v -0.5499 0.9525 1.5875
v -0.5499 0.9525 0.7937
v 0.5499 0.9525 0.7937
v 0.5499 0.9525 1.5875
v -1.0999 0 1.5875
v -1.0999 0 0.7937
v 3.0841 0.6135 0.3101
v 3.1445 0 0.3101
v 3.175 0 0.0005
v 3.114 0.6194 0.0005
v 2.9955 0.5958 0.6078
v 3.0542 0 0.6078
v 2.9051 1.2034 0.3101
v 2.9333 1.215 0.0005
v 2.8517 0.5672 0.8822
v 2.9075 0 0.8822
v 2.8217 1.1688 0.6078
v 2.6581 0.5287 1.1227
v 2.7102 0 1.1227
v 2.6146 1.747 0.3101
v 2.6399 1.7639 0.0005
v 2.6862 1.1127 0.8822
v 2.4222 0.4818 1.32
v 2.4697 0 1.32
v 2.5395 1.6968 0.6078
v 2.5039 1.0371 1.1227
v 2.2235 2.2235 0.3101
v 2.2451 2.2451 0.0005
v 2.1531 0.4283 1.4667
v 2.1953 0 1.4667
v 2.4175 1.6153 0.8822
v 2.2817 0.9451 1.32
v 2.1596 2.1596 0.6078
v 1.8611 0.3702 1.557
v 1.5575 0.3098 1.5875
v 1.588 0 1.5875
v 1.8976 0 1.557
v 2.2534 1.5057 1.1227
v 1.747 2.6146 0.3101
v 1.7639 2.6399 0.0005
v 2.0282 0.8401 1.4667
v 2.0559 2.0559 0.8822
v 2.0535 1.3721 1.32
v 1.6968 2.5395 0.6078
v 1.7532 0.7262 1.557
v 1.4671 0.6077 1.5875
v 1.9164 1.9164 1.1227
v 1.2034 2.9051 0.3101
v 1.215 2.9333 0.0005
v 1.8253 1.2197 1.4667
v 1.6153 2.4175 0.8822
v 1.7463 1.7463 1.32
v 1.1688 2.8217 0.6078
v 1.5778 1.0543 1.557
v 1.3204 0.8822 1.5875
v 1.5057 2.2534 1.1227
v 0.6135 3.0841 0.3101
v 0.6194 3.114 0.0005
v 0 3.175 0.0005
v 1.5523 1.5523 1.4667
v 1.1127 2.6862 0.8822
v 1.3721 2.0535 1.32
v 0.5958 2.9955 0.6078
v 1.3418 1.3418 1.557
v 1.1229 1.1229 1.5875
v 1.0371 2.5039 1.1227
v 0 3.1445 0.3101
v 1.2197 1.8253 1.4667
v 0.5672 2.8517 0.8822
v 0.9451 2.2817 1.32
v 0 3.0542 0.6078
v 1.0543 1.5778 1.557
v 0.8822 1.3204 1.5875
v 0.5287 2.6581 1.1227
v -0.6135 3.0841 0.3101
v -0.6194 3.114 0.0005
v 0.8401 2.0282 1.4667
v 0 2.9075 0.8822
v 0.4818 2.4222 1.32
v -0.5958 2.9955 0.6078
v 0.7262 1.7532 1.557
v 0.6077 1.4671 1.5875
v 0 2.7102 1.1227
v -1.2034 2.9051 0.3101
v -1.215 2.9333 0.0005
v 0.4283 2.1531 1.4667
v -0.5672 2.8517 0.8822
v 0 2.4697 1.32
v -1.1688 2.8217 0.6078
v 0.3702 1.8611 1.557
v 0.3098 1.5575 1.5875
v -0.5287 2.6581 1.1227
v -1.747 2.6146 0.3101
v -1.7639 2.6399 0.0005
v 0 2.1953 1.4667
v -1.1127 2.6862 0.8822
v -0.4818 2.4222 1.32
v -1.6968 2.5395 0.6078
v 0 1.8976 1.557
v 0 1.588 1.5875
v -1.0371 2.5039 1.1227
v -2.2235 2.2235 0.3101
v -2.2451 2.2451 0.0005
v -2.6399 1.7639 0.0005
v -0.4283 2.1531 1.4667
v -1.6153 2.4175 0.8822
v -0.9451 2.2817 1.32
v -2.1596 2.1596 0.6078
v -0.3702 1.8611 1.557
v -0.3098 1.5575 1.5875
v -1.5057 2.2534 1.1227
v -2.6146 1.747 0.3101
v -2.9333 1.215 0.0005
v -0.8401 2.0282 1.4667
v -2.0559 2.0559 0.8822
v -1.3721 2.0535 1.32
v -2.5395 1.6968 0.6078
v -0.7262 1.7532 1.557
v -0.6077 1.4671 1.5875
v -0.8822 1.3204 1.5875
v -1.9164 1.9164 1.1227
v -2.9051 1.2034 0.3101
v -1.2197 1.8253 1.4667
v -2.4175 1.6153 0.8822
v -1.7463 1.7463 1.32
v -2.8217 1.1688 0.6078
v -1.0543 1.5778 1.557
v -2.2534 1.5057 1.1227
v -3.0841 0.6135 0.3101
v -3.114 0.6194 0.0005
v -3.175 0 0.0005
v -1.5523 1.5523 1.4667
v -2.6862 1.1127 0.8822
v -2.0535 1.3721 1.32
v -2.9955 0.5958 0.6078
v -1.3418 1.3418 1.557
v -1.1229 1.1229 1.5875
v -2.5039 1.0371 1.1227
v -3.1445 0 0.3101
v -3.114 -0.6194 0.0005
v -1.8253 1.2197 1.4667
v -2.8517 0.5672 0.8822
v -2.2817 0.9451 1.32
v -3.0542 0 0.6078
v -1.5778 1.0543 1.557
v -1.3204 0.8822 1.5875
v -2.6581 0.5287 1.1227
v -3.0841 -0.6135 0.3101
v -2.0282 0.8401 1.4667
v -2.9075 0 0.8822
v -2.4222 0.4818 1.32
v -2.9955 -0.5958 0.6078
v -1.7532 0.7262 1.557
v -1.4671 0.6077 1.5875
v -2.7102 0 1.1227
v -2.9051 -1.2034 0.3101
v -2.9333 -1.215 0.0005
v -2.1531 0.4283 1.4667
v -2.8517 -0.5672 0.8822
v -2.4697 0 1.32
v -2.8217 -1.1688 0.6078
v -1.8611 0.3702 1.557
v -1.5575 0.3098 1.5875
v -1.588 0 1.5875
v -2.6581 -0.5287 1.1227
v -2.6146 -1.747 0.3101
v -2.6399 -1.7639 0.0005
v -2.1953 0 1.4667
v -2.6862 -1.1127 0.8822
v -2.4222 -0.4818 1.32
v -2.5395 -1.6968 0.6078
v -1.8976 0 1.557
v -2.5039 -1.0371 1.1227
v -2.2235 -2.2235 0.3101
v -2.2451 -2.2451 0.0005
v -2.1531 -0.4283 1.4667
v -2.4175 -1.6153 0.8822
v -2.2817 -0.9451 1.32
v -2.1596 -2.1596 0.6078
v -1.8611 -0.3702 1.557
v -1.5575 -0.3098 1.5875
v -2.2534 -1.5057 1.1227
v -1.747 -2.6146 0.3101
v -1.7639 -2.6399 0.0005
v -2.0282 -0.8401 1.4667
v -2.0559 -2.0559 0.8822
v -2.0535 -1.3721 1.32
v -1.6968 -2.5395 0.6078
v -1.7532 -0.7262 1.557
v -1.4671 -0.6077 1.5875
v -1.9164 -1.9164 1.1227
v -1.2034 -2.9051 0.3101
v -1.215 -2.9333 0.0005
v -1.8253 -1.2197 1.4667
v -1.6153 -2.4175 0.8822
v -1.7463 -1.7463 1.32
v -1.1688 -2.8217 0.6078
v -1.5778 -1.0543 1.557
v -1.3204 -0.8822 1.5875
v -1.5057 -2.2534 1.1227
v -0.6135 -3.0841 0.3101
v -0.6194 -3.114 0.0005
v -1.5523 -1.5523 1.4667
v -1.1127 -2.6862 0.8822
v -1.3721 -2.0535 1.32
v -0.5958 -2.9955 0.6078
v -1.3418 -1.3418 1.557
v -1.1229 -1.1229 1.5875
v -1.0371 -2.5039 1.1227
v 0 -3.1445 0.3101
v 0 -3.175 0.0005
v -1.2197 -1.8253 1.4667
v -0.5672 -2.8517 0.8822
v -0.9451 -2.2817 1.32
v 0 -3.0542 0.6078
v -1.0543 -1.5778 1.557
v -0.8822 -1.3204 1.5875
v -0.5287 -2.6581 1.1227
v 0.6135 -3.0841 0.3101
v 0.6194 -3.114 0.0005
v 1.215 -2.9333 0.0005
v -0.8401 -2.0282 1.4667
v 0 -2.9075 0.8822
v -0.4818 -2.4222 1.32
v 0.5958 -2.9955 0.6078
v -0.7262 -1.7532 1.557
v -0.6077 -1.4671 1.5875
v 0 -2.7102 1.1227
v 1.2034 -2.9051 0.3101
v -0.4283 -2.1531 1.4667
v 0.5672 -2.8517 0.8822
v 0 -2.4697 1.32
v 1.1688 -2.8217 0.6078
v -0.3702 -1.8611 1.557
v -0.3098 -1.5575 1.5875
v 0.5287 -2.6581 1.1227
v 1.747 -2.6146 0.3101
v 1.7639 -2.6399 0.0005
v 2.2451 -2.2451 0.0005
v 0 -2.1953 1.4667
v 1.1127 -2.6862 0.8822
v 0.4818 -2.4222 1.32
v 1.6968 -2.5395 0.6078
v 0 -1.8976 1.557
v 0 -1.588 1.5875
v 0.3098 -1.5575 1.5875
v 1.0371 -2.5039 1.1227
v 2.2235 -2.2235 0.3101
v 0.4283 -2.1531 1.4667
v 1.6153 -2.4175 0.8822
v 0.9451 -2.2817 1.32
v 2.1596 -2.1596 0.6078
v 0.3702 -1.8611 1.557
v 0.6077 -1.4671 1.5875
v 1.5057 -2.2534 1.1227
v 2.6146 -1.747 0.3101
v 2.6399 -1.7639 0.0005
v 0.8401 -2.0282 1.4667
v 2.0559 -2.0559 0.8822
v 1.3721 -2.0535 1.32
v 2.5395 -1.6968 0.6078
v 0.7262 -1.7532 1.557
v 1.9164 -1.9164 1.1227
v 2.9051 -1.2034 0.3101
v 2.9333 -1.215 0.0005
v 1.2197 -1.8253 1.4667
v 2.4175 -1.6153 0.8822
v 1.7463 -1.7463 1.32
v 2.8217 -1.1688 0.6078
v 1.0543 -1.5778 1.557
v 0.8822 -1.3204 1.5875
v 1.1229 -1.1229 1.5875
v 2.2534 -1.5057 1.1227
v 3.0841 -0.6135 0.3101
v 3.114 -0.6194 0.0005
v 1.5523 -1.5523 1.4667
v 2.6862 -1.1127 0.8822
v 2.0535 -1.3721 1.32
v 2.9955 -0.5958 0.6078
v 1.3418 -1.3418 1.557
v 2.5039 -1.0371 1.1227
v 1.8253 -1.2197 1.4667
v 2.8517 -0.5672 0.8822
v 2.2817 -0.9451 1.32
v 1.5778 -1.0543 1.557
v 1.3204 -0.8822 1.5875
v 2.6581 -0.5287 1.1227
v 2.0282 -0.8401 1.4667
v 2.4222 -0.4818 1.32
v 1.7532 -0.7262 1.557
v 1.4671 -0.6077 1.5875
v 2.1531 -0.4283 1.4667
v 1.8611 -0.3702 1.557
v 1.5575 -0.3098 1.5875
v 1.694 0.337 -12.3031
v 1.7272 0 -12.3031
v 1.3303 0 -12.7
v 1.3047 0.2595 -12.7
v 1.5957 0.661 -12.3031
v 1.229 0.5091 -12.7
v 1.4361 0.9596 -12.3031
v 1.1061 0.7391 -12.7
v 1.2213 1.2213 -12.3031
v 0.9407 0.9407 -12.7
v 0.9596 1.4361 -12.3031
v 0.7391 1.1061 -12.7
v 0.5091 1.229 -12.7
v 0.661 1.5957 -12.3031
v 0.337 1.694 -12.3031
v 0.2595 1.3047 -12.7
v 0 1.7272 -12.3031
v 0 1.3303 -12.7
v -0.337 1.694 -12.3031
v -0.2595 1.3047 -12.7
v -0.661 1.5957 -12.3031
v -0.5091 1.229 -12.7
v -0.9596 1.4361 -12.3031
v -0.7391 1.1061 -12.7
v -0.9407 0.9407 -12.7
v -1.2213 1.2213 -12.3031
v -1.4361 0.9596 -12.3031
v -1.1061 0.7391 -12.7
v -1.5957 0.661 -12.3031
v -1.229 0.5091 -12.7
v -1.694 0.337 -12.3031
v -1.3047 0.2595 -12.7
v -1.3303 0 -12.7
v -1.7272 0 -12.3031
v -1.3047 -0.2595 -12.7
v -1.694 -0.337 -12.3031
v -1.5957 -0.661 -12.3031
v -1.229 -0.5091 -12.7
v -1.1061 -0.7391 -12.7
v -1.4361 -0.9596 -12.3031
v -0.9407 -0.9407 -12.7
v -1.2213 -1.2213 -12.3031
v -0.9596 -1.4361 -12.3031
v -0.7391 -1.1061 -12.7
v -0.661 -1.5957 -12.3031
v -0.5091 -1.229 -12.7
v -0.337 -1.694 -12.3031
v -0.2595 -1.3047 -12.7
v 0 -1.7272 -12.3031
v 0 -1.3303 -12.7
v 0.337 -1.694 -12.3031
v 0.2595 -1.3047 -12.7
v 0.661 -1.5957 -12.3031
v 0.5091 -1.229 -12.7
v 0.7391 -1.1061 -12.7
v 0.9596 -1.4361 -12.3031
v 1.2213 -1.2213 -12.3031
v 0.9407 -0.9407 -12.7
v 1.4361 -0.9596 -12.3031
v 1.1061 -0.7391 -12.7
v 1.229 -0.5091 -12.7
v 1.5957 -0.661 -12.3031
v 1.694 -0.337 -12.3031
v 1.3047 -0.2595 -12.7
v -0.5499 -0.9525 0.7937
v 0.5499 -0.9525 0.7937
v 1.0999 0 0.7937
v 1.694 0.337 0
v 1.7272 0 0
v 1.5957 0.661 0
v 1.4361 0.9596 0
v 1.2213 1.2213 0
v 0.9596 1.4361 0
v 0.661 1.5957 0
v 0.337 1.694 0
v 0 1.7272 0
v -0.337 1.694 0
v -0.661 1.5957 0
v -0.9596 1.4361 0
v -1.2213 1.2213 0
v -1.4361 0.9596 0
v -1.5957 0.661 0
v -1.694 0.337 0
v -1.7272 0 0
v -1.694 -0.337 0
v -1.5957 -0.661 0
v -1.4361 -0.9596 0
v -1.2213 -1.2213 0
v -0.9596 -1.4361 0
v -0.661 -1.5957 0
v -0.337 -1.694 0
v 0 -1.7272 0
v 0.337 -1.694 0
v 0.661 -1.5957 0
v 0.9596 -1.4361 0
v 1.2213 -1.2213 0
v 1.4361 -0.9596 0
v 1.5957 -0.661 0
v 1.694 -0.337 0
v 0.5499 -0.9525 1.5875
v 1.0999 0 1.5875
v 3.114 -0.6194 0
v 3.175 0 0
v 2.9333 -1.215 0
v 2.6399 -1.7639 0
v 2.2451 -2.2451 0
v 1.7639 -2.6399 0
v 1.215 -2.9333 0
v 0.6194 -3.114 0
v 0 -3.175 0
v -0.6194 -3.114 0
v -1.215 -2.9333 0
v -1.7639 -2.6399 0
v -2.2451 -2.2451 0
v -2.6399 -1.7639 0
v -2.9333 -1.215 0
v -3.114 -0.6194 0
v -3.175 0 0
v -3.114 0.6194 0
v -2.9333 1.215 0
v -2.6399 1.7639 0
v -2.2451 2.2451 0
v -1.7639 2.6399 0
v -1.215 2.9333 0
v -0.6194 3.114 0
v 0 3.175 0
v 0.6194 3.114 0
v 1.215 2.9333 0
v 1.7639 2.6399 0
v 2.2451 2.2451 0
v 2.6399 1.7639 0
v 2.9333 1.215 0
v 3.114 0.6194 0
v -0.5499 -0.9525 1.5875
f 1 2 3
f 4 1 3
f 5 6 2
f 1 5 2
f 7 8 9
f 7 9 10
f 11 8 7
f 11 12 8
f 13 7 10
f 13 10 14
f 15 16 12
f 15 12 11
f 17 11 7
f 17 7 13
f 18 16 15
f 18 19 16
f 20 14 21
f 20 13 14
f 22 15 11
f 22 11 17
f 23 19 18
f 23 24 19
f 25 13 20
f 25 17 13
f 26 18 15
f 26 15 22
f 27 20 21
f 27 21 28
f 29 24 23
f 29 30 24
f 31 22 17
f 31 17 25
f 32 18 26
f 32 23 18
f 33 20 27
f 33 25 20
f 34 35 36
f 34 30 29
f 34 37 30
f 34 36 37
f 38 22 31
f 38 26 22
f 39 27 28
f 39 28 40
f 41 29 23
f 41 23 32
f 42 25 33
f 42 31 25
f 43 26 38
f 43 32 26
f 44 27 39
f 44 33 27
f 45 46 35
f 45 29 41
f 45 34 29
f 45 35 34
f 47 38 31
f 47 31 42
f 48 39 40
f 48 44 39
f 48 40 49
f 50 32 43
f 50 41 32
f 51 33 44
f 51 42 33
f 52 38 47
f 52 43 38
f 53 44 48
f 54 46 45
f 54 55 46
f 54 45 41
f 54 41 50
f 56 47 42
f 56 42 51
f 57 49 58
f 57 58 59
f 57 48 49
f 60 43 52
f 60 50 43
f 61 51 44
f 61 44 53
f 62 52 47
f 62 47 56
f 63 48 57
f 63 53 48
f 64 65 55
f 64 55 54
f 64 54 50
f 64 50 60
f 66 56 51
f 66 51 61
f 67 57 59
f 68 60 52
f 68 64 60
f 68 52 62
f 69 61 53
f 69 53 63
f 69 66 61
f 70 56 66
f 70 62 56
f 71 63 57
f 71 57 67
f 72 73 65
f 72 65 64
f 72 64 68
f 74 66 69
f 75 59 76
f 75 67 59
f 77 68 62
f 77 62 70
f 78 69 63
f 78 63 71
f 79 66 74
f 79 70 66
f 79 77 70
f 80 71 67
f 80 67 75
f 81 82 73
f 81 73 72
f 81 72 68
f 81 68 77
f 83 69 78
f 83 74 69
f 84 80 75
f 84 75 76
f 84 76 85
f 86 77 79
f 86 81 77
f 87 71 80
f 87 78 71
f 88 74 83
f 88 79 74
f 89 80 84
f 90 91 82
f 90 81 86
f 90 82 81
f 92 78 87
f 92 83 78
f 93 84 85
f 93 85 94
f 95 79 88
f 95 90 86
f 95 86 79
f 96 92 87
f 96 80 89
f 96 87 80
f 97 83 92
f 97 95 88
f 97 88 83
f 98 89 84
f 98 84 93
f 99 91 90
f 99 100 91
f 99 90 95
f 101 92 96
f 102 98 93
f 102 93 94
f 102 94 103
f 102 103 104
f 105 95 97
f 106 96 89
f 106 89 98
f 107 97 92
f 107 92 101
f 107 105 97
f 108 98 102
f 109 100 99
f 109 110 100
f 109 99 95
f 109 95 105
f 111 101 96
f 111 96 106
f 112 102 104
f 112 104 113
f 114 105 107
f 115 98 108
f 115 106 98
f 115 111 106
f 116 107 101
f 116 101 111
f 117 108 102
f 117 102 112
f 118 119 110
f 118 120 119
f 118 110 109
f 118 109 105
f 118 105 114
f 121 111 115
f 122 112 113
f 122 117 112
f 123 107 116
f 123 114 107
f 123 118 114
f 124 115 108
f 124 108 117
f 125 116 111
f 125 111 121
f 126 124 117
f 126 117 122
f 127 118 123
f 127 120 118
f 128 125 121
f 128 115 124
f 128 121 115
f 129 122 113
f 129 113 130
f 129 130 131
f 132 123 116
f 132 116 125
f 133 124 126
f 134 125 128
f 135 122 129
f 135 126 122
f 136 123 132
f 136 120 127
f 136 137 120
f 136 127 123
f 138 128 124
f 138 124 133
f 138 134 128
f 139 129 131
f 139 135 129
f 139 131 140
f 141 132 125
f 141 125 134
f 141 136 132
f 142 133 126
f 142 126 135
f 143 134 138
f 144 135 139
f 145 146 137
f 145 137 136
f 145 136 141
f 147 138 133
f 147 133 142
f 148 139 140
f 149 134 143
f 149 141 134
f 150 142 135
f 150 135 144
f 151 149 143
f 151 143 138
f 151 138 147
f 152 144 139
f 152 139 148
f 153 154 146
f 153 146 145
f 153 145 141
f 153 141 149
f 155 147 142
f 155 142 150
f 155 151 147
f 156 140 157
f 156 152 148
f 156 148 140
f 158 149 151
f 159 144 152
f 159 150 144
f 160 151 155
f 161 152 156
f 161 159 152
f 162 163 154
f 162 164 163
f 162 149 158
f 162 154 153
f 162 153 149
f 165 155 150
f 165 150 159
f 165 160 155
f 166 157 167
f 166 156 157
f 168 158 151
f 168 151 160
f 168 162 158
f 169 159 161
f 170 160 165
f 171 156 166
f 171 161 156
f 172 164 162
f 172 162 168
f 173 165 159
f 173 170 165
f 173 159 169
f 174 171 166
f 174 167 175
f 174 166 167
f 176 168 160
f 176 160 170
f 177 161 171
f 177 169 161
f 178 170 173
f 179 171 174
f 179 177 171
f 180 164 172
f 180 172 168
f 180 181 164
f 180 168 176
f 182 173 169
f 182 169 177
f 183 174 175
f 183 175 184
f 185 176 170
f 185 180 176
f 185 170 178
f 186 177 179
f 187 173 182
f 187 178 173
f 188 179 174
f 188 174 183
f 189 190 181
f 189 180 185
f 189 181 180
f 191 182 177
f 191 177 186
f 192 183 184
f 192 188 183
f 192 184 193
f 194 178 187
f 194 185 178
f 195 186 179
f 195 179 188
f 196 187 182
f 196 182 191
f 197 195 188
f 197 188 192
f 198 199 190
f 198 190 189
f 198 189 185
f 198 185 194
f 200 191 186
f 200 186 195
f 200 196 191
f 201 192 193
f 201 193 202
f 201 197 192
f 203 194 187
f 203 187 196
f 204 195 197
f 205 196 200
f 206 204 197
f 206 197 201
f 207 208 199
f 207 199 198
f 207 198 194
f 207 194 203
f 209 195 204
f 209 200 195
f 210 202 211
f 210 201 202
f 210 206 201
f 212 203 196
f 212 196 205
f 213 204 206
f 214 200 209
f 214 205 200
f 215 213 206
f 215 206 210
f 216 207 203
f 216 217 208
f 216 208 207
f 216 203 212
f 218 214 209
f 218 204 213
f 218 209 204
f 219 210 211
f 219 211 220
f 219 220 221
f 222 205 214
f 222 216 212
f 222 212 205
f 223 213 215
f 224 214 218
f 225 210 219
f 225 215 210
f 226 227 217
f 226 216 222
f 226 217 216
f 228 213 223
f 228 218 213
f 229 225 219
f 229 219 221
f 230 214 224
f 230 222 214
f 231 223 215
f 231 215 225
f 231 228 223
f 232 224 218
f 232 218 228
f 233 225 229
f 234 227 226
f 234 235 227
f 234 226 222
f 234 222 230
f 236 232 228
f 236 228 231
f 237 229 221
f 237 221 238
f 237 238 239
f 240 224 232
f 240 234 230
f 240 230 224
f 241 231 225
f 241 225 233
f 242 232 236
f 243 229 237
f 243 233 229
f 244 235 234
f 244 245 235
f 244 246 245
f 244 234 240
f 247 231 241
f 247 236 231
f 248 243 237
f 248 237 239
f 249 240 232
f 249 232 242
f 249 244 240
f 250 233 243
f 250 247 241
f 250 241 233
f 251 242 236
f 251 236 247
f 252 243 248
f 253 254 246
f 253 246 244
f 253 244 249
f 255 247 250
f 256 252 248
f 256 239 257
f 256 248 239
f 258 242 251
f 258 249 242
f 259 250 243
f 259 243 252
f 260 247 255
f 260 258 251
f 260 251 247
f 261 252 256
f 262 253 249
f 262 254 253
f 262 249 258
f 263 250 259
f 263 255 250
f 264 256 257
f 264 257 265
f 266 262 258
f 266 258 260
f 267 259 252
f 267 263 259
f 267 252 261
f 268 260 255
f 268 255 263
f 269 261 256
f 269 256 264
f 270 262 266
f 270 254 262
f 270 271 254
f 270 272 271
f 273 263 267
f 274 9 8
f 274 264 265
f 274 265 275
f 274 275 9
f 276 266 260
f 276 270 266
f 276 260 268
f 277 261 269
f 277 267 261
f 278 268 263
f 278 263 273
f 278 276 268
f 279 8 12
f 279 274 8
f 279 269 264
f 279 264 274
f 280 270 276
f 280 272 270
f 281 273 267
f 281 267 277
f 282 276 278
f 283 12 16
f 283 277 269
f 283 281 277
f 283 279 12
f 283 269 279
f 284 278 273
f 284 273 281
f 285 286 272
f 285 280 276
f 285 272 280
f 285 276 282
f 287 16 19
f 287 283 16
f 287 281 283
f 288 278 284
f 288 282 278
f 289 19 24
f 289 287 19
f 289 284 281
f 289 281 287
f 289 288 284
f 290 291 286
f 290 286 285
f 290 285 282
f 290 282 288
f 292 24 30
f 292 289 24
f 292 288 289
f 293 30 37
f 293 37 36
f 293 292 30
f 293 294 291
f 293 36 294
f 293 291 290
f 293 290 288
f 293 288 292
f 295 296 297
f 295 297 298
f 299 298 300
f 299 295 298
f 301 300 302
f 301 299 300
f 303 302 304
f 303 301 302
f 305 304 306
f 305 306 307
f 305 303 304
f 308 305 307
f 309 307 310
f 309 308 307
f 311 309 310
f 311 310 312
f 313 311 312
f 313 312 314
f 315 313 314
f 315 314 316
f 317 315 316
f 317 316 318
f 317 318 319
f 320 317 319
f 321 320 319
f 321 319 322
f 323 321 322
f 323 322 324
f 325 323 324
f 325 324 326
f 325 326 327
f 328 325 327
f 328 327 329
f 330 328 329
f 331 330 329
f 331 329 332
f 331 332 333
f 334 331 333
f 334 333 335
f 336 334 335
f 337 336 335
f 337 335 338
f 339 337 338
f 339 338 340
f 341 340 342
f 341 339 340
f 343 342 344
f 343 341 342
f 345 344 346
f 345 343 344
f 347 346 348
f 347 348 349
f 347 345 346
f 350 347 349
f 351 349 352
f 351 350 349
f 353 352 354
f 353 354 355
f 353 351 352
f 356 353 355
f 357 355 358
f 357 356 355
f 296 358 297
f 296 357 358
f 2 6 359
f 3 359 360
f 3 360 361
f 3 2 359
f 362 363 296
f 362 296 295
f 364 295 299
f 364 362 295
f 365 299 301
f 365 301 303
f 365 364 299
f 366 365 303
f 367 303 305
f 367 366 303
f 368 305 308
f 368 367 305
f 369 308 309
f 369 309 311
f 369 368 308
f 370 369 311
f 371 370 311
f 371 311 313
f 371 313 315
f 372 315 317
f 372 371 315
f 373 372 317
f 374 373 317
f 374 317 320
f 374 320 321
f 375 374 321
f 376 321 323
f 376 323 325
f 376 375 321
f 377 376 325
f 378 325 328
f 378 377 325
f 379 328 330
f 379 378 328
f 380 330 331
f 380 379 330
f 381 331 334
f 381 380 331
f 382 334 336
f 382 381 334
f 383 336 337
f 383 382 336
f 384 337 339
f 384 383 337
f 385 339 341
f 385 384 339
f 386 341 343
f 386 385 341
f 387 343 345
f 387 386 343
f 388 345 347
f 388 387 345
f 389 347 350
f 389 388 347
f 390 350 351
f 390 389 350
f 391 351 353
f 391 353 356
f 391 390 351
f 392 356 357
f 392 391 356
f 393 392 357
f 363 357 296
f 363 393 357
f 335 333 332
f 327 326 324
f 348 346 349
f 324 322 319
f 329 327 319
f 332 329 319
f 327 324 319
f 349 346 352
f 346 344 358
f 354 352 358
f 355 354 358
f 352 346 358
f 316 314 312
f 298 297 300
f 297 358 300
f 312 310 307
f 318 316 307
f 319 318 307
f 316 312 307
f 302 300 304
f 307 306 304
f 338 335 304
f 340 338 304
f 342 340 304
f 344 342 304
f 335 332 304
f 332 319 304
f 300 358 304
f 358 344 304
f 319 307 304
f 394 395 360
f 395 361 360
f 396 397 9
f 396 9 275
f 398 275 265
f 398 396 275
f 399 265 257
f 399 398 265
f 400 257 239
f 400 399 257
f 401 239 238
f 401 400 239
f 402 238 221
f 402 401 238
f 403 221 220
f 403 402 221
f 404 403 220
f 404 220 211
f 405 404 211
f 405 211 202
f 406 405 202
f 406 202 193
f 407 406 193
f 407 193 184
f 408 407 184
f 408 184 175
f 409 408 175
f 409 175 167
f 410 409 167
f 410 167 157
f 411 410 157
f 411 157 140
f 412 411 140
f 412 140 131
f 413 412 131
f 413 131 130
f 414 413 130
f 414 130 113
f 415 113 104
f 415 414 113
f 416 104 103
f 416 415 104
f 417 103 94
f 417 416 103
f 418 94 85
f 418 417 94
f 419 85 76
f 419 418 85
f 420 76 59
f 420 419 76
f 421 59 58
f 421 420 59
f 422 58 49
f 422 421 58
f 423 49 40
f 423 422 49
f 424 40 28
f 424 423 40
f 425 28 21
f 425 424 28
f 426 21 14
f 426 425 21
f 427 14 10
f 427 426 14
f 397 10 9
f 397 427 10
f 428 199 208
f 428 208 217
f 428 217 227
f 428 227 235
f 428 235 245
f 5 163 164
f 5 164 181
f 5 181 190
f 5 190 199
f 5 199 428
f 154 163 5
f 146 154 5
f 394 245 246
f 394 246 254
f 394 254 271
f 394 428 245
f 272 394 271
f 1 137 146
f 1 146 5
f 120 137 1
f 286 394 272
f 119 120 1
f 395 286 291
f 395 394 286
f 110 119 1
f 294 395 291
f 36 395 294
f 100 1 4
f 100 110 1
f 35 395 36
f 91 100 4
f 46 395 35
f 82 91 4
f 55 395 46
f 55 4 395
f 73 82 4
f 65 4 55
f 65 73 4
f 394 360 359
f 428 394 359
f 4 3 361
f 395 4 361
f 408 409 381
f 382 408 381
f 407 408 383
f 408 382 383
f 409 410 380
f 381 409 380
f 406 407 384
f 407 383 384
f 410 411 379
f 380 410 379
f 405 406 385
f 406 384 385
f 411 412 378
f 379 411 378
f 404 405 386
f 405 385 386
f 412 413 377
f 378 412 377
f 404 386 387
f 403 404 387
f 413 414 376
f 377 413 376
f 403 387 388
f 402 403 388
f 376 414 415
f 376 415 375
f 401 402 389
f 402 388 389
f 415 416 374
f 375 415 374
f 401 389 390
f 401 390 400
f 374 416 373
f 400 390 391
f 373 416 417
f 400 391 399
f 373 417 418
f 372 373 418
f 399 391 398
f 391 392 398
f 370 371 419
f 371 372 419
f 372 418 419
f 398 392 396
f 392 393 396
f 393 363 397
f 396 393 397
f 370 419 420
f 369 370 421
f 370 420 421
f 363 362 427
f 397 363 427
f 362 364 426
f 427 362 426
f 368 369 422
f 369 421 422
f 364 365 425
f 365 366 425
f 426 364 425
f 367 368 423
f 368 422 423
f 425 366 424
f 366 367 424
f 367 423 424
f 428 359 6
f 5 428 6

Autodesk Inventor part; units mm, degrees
ref_plane "YZ Plane" through (0, 0, 0) normal (1, 0, 0) x (0, 1, 0)
ref_plane "XZ Plane" through (0, 0, 0) normal (0, 1, 0) x (-1, 0, 0)
ref_plane "XY Plane" through (0, 0, 0) normal (0, 0, 1) x (1, 0, 0)
sketch "Sketch1" plane through (0, 0, 0) normal (0, 0, 1) x (1, 0, 0)
  circle A0 centre (0, 0) radius 3.175
  circle A1 centre (0, 0) radius 1.7272
  line L0 (0.5499, 0.9525) -> (1.0999, 0)
  line L1 (1.0999, 0) -> (0.5499, -0.9525)
  line L2 (0.5499, -0.9525) -> (-0.5499, -0.9525)
  line L3 (-0.5499, -0.9525) -> (-1.0999, 0)
  line L4 (-1.0999, 0) -> (-0.5499, 0.9525)
  line L5 (-0.5499, 0.9525) -> (0.5499, 0.9525)
  dimension "d0" = 3.4544
  dimension "d1" = 6.35
  dimension "d2" = 1.905
extrude "Extrusion1" add sketch "Sketch1" against normal blind 12.7 contours A1 | L0 L1 L2 L3 L4 L5
extrude "Extrusion2" add sketch "Sketch1" along normal blind 1.5875 contours A0 | A1
extrude "Extrusion3" add sketch "Sketch1" along normal blind 0.7937 contours L0 L1 L2 L3 L4 L5
thread "Thread1" size "6-32 UNC" class "2A" standard "ANSI Unified Screw Threads" full length
chamfer "Chamfer1" distance 0.3969 angle 45 1 edges at (-1.7272, 0, -12.7)
fillet "Fillet1" radius 1.5875 1 edges at (-3.175, 0, 1.5875)
properties part number "6 32 bolt 0.5''"
